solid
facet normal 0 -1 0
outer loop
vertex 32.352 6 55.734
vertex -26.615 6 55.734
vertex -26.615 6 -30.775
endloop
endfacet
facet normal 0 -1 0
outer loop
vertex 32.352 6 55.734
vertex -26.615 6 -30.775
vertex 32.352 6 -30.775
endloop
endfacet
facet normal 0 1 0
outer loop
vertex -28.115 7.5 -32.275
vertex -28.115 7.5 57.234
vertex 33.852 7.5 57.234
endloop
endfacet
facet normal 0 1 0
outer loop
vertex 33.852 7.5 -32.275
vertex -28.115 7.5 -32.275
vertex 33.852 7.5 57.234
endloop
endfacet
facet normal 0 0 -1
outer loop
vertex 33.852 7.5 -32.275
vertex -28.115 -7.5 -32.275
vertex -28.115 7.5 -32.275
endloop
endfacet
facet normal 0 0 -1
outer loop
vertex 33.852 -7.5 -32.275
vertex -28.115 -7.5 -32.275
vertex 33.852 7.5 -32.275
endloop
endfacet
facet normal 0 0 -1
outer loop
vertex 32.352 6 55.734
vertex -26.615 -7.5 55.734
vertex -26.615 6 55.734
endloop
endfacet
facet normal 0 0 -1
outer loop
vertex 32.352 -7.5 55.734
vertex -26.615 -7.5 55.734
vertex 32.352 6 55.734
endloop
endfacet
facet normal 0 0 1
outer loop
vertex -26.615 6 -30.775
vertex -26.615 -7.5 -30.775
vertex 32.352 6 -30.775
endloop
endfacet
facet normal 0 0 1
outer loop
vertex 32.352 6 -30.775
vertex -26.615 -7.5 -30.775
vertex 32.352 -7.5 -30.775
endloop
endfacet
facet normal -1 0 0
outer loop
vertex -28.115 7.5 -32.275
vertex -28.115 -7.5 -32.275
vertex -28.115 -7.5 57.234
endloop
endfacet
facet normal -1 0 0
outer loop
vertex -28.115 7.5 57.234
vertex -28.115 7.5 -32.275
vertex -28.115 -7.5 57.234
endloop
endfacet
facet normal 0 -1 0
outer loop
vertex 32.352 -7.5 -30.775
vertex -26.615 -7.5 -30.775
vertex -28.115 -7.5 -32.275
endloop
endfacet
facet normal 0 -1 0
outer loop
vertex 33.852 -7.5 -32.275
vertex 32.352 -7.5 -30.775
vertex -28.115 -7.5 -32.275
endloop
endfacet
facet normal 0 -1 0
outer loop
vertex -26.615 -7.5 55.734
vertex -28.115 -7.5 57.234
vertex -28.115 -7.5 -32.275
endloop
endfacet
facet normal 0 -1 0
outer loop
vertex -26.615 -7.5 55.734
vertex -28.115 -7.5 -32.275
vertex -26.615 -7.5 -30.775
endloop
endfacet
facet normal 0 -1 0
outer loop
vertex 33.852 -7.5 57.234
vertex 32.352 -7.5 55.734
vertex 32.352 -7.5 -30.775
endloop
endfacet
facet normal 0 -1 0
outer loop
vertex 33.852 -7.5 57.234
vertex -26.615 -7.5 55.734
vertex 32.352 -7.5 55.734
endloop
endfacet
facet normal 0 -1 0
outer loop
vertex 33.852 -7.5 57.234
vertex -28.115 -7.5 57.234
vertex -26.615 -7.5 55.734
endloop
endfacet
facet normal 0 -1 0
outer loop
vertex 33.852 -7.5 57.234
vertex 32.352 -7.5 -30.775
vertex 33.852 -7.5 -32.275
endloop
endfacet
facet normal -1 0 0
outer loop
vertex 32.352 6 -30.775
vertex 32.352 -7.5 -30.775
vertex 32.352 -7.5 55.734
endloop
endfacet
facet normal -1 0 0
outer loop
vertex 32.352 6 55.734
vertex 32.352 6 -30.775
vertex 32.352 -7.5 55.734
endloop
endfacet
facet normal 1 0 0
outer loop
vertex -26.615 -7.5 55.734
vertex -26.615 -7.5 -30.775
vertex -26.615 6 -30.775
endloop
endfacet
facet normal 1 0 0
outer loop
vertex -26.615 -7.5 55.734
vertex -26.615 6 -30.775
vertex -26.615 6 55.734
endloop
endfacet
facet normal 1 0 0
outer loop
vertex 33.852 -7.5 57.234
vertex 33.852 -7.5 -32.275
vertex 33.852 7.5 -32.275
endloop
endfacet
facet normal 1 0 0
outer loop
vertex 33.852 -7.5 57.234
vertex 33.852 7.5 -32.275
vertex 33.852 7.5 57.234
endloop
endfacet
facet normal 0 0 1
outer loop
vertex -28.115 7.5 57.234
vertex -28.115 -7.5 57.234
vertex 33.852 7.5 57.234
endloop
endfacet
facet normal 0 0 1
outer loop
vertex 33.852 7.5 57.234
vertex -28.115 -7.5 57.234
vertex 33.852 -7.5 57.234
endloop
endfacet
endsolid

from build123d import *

# Parameters (mm, degrees)
F0_W     = 61.967217
F0_H     = 89.508198
F1_DEPTH = 7.5
F2_T     = -1.5


with BuildPart() as f1:
    # F0 (on Front) → F1 (new body, symmetric)
    with BuildSketch(Plane.XZ):
        with Locations((2.868853, 12.47951)):
            Rectangle(F0_W, F0_H)
    extrude(amount=F1_DEPTH, both=True)

    # F2
    f2_openings = [f1.faces().sort_by_distance(p)[0] for p in [
        (2.868854, -7.5, 12.47951),
    ]]
    offset(amount=F2_T, openings=f2_openings)


solid = f1.part
